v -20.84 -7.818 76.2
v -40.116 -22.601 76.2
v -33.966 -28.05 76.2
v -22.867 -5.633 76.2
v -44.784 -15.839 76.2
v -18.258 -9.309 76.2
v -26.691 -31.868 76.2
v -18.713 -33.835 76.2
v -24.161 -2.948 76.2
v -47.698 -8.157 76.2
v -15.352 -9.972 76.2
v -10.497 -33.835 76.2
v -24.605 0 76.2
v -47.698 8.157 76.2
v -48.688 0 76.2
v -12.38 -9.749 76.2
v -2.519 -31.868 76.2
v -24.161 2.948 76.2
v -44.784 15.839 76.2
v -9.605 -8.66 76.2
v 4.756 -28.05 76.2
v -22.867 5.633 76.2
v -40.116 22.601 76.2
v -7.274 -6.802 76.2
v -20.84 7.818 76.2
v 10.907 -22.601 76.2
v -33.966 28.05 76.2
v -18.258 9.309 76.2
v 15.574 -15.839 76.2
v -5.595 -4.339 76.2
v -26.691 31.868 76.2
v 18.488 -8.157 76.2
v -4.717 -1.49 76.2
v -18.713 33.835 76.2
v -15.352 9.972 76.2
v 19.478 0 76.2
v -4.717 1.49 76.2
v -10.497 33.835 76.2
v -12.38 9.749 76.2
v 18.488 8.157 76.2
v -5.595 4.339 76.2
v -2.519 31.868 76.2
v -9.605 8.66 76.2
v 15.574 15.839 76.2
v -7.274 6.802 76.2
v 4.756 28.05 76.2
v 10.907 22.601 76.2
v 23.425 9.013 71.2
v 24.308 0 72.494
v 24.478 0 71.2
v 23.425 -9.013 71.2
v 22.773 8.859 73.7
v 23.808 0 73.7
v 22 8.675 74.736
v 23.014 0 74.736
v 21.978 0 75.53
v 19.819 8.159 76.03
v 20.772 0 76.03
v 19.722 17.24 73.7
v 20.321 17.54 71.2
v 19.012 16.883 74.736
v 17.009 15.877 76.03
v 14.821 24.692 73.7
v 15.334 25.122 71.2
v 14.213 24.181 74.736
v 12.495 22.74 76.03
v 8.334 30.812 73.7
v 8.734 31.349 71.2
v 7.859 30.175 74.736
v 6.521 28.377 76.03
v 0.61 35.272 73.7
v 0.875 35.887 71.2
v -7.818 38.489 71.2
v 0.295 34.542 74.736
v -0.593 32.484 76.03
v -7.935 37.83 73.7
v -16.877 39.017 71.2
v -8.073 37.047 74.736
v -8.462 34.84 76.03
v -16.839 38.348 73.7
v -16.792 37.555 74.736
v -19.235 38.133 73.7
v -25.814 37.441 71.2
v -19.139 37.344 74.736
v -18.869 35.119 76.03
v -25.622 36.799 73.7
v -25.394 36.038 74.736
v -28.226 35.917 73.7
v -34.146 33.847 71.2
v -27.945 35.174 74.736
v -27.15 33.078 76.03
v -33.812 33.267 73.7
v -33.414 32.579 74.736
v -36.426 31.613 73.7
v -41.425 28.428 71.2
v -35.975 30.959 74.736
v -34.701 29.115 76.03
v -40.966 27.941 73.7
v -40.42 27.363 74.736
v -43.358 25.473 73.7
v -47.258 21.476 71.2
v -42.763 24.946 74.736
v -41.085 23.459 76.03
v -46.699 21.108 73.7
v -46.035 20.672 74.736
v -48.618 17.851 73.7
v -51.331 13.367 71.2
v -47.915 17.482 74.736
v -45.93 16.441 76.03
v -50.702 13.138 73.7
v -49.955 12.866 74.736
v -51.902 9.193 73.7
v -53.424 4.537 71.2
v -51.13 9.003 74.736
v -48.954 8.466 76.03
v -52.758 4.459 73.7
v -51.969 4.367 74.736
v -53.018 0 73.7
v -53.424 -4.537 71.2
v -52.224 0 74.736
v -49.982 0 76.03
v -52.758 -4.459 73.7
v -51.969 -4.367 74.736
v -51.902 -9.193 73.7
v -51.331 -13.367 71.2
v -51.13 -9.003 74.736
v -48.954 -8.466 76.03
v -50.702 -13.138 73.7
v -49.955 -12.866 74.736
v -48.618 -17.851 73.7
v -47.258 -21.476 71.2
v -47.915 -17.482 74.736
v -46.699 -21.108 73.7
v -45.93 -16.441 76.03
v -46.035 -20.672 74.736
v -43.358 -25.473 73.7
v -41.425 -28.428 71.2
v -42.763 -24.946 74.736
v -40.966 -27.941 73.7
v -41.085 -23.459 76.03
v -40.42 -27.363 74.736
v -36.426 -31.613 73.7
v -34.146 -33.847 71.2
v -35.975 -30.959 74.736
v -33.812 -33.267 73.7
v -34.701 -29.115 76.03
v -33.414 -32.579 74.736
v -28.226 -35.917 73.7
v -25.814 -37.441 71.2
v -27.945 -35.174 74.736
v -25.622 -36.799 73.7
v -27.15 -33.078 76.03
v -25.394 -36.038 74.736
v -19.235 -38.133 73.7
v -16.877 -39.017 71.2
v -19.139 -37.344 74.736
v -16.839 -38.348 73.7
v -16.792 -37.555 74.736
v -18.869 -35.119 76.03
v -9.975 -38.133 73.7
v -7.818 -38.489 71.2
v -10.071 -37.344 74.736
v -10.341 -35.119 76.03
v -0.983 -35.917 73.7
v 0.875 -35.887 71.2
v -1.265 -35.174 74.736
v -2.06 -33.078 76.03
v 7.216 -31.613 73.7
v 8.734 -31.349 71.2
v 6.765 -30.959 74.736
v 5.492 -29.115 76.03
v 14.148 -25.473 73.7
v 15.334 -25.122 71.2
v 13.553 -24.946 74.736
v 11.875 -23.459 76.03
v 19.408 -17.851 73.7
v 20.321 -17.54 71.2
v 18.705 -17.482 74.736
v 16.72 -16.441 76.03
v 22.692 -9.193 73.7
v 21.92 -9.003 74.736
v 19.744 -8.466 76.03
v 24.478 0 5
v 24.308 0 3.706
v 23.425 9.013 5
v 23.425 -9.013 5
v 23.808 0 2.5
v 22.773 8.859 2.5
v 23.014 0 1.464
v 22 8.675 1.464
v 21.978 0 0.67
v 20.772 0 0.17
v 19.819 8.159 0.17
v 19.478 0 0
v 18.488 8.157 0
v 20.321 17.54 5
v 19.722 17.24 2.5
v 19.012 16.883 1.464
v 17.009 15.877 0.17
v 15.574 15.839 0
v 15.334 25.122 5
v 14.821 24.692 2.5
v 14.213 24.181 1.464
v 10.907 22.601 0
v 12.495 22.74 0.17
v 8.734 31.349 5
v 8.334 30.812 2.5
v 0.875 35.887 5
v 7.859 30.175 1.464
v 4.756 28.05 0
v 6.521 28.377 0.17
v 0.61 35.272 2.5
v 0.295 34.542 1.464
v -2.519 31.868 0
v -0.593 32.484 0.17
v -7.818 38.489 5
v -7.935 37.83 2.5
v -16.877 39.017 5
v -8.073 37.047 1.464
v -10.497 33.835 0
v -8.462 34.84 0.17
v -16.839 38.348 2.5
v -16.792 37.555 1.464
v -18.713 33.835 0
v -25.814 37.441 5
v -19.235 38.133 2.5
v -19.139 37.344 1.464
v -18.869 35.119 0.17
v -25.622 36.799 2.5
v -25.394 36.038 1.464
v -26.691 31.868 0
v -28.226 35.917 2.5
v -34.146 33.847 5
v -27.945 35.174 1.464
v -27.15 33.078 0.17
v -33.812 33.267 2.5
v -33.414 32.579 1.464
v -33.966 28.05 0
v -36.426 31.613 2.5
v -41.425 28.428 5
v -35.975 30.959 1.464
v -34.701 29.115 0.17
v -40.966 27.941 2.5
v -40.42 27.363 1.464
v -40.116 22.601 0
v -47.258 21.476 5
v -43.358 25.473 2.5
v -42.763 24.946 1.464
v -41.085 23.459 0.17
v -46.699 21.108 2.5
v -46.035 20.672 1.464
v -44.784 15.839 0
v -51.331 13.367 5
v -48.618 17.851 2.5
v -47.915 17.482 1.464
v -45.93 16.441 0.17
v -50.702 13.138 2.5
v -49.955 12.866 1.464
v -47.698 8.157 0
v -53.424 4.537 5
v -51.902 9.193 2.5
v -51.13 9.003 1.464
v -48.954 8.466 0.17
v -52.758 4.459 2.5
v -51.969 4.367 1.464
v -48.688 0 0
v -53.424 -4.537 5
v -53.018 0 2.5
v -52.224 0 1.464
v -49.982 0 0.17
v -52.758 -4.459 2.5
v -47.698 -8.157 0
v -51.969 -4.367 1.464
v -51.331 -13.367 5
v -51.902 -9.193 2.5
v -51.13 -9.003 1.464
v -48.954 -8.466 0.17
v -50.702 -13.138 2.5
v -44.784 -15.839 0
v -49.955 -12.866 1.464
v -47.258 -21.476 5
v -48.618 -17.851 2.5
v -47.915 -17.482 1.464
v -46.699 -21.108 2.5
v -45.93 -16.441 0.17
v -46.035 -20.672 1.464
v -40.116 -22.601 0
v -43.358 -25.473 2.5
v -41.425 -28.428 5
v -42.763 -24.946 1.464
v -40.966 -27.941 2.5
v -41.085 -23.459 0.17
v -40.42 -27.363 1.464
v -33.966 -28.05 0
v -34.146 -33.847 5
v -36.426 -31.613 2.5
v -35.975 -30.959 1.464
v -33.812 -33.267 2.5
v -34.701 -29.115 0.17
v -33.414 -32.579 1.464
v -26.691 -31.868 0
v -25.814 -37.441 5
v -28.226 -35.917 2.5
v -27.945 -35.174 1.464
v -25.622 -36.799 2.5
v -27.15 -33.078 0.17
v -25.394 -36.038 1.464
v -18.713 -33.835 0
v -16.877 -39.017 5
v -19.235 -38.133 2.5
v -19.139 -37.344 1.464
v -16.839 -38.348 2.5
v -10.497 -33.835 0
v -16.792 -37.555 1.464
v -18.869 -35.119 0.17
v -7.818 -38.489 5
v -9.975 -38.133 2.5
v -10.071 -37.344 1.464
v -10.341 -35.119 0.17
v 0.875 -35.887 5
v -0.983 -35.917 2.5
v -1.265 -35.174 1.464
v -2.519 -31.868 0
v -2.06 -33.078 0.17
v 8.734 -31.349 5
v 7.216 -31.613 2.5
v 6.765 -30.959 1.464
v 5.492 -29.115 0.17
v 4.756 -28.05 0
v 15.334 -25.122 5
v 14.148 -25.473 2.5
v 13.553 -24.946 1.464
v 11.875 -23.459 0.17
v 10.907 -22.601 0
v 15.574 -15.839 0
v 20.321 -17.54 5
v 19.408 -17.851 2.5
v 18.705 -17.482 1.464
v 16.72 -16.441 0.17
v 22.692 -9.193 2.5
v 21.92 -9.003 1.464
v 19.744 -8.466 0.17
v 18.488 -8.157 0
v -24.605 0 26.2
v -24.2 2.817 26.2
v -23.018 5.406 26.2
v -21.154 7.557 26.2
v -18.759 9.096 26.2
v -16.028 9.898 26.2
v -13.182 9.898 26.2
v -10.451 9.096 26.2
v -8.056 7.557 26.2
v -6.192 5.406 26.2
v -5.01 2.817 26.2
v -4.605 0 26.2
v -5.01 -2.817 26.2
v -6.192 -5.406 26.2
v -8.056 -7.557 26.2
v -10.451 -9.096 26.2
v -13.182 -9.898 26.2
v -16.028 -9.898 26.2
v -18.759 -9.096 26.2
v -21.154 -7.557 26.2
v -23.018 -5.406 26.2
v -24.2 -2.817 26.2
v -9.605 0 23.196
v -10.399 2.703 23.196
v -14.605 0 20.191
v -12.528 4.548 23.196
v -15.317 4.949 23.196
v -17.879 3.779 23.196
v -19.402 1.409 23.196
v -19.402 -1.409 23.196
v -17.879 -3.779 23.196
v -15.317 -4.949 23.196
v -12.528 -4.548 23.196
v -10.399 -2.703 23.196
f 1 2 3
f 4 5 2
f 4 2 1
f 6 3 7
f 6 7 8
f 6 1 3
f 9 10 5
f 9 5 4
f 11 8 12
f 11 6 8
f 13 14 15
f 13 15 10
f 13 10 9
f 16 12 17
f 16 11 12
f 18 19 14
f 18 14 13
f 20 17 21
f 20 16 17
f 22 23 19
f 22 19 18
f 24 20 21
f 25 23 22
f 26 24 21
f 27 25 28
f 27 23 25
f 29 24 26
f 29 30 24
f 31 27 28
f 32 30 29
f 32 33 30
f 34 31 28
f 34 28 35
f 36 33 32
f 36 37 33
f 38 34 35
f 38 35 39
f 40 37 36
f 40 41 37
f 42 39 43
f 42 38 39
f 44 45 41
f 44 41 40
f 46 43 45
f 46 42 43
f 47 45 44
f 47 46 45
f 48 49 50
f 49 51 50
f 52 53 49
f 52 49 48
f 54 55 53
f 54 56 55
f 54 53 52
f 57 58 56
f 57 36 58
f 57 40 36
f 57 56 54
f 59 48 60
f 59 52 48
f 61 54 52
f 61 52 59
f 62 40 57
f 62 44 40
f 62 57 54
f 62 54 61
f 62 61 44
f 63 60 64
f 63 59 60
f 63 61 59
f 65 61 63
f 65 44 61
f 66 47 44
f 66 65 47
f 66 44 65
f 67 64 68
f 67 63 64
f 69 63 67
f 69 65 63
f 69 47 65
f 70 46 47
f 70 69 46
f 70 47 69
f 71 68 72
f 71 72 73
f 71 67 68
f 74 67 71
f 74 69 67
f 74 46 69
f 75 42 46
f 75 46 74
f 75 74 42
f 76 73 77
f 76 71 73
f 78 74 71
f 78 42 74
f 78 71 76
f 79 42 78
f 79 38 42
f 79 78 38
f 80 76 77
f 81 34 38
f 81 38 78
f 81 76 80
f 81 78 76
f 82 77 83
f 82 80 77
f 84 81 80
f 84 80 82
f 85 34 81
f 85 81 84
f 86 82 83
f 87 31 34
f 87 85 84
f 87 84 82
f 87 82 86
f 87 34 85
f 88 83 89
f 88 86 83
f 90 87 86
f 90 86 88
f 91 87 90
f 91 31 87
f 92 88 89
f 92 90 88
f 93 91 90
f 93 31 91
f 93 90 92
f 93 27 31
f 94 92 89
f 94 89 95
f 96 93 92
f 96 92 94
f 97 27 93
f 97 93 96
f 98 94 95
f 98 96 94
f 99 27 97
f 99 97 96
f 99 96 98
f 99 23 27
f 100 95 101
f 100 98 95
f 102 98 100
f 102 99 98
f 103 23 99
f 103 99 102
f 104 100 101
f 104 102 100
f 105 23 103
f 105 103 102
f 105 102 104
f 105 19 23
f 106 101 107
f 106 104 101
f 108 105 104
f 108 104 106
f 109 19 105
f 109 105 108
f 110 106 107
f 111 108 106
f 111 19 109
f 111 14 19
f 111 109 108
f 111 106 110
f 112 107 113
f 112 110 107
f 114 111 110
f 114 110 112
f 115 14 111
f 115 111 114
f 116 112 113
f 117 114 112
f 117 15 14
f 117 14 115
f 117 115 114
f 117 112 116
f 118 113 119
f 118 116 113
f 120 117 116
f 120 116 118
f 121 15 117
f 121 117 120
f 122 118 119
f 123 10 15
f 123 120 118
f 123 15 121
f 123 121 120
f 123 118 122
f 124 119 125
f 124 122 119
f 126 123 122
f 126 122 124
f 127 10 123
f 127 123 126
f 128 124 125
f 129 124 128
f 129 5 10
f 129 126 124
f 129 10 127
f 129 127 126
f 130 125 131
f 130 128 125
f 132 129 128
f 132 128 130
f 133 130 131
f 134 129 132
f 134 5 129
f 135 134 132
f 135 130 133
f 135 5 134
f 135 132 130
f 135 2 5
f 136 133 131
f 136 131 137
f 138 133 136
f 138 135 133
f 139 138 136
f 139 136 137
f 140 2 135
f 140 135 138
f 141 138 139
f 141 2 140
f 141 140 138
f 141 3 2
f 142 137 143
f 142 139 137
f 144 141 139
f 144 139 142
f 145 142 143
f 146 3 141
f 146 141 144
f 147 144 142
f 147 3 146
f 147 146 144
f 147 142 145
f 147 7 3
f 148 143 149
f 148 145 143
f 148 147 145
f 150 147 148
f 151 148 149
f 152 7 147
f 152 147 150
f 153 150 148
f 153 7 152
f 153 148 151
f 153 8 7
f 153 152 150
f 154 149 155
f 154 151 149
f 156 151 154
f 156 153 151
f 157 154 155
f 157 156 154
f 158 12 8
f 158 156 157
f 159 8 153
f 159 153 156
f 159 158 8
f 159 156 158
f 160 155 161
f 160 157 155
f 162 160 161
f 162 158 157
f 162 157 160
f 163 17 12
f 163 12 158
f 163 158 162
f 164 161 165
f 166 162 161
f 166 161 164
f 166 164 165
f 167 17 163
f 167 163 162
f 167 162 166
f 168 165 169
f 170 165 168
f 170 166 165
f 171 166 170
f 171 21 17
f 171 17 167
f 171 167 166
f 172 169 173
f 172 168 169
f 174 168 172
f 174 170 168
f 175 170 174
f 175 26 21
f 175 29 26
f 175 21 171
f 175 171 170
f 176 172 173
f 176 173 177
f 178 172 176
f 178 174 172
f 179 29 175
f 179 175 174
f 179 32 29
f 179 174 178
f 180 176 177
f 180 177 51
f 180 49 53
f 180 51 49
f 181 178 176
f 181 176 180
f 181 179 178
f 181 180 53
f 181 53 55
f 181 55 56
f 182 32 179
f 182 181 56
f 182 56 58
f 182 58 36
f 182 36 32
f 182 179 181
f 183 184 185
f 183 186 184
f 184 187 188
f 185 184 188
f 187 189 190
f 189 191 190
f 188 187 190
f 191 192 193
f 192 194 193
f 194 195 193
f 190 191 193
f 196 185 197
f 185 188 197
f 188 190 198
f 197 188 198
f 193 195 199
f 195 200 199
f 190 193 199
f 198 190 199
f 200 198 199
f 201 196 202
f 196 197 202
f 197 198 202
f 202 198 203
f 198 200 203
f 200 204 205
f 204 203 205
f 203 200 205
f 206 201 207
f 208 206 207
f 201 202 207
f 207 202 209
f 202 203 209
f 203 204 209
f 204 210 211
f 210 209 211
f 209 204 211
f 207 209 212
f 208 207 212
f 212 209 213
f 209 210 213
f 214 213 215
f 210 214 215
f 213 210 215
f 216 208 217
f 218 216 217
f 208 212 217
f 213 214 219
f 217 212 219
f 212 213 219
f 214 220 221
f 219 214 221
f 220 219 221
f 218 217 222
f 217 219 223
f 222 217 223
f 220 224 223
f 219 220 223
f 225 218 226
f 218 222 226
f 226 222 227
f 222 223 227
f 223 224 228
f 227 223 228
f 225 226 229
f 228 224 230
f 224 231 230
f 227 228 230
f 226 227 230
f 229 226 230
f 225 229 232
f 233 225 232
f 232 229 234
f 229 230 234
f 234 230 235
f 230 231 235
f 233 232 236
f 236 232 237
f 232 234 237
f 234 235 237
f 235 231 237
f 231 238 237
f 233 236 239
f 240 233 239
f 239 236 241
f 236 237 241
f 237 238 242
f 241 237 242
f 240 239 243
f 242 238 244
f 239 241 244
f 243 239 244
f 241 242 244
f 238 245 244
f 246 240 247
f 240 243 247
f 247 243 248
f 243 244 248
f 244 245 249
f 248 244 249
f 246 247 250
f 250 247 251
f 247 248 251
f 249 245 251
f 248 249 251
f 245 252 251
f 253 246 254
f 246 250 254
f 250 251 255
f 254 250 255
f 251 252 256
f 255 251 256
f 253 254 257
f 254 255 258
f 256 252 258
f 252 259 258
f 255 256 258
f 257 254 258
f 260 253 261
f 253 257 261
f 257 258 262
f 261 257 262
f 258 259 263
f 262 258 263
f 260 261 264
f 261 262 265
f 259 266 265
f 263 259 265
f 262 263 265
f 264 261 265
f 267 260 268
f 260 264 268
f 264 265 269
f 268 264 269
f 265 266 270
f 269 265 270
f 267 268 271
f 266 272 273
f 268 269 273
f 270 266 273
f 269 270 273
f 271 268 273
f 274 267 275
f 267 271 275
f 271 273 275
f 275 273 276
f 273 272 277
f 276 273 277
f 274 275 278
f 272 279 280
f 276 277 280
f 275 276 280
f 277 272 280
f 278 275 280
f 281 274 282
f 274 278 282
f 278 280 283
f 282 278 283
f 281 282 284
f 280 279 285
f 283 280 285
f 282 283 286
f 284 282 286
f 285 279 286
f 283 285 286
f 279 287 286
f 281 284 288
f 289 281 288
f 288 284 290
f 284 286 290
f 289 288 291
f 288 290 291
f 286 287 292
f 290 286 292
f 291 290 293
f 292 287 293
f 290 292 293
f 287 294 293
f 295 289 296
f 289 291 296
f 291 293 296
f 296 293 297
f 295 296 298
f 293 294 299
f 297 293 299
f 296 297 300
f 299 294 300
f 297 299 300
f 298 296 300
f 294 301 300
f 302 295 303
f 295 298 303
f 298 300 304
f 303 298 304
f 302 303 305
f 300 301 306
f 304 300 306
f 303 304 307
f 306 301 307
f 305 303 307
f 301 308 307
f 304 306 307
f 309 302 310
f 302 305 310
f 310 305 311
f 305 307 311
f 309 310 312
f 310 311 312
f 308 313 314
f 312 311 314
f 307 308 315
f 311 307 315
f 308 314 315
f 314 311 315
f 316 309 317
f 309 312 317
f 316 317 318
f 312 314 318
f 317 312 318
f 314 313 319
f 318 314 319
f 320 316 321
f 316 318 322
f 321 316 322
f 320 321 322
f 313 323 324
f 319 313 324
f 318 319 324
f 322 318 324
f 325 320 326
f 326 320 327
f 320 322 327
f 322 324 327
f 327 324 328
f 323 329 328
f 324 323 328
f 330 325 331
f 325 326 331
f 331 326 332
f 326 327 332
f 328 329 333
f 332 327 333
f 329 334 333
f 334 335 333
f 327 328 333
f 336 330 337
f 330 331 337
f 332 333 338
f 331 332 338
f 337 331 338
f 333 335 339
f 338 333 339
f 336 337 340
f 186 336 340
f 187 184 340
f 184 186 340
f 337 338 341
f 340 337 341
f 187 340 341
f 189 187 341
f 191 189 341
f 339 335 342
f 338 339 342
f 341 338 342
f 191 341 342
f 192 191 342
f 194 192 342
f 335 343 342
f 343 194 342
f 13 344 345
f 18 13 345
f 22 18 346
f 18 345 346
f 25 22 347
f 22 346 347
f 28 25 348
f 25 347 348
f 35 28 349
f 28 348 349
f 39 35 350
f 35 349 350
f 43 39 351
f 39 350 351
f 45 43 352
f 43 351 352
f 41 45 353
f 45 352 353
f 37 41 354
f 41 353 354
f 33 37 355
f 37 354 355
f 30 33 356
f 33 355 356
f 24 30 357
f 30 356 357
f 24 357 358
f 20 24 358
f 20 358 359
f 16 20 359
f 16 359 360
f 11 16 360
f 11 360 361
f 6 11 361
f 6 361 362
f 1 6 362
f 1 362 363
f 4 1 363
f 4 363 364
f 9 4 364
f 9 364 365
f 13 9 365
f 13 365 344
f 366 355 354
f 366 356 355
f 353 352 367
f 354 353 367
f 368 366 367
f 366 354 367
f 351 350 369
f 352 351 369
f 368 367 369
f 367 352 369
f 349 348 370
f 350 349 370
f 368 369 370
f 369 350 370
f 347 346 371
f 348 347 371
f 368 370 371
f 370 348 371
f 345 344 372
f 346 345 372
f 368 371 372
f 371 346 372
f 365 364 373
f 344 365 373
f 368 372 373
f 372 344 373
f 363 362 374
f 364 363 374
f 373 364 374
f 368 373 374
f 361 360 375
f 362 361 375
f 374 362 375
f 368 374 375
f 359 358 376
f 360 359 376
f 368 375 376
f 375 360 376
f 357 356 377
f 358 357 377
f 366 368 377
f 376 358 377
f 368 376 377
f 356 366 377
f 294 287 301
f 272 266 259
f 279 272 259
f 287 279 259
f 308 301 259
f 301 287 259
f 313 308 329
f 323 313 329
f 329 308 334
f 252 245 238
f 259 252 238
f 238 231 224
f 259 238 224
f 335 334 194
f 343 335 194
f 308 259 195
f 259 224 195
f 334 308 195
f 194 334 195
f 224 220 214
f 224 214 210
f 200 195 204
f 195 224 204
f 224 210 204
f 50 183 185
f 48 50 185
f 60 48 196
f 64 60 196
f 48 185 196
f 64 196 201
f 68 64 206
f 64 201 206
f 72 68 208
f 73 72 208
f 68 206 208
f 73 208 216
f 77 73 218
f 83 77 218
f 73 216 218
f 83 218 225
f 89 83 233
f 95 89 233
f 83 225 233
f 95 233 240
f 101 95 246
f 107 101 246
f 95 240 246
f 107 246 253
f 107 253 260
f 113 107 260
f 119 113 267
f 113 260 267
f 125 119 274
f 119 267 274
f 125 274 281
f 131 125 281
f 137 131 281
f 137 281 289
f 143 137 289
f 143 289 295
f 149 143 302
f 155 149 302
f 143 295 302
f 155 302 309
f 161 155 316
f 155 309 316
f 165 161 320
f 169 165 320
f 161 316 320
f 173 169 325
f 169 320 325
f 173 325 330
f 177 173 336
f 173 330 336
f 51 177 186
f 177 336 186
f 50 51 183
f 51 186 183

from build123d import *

# Parameters (mm, degrees)
F0_R           = 39.0830403339
F1_DEPTH       = 76.2
F2_R           = 5
F4_D           = 20
F4_DEPTH       = 50
F4_CBORE_D     = 20
F4_CBORE_DEPTH = 30
F4_TIP         = 6.0086061903


with BuildPart() as f1:
    # F0 (on Top) → F1 (new body)
    with BuildSketch(Plane.XY):
        with Locations((-14.6049745381, 0)):
            Circle(F0_R)
    extrude(amount=F1_DEPTH)

    # F2
    f2_edges = [f1.edges().sort_by_distance(p)[0] for p in [
        (24.478066, 0, 38.1),
        (-53.688015, 0, 0),
        (-53.688015, 0, 76.2),
    ]]
    fillet(f2_edges, radius=F2_R)

    # F4
    with Locations(Plane.XY.offset(76.2)):
        with Locations((-14.6049745381, 0)):
            CounterBoreHole(F4_D / 2, F4_CBORE_D / 2, F4_CBORE_DEPTH, depth=F4_DEPTH)
            with Locations((0, 0, -(F4_DEPTH + F4_TIP / 2))):  # 118° drill point
                Cone(0, F4_D / 2, F4_TIP, mode=Mode.SUBTRACT)


solid = f1.part
